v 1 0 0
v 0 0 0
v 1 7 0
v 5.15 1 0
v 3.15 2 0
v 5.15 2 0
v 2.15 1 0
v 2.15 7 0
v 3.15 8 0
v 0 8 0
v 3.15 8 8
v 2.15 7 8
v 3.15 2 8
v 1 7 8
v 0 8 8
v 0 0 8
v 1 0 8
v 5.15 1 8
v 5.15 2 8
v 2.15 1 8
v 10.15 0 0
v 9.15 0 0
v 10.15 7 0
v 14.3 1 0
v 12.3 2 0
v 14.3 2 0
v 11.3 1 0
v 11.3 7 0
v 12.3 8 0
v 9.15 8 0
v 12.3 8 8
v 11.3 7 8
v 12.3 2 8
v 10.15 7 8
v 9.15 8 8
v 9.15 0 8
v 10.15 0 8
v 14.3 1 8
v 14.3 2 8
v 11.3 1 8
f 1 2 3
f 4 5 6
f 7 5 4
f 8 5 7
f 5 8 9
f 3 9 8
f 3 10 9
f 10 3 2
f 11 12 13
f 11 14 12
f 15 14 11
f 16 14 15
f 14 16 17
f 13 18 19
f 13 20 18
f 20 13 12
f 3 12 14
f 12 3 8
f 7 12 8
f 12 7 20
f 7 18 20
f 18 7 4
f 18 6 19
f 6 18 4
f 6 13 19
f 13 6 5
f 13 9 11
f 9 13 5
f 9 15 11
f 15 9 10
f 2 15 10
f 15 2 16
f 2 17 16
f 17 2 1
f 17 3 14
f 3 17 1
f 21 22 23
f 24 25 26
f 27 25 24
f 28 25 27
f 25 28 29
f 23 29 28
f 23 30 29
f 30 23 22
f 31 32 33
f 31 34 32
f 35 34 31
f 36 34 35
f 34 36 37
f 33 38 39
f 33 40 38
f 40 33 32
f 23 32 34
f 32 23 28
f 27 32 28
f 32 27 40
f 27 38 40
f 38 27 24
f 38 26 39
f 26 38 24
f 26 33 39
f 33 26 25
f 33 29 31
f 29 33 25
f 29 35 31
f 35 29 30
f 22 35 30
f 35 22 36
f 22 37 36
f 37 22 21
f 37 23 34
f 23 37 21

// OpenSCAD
// Klammer (gruenes Teil) fuer Geberit Heberglocke AV02 / 5200.017 - parametrisch
// Masse aus der Handskizze des Originals. Umgedrehtes U (Schlitz fuer die Becherwand)
// mit Nase unten innen; das weisse Teil liegt in der Tasche auf der Nase auf.
// MakerWorld: "Parametric Model Maker" -> diese Datei hochladen.

/* [Masse] */
// Gesamthoehe [mm]
hoehe = 8; // [3:0.1:30]
// Dicke aeusseres Bein [mm]
bein = 1; // [0.6:0.1:5]
// Schlitzbreite = Becherwand [mm]
schlitz = 1; // [0.3:0.05:5]
// zusaetzliche Luft im Schlitz [mm]
spiel = 0.15; // [0:0.05:1]
// Dicke ueber dem Schlitz [mm]
steg_oben = 1; // [0.6:0.1:5]
// Dicke inneres Bein [mm]
bein_i = 1; // [0.6:0.1:5]
// Breite Nase ab Aussenkante inneres Bein (inkl. Bein) [mm]
nase_b = 3; // [1:0.1:15]
// Dicke der Nase [mm]
nase_d = 1; // [0.6:0.1:5]
// Abstand Oberkante bis Oberseite Nase [mm]
tasche = 6; // [1:0.1:29]
// Breite der Klammer (in die Tiefe) [mm]
breite = 8; // [2:0.5:30]
// Anzahl Klammern
anzahl = 2; // [1:1:8]

/* [Hidden] */
s  = schlitz + spiel;
x1 = bein; x2 = bein + s; x3 = bein + s + bein_i; xn = bein + s + nase_b;
yo = hoehe - tasche;
yu = max(0, yo - nase_d);
ys = hoehe - steg_oben;

module profil() {
    polygon([[0, 0], [x1, 0], [x1, ys], [x2, ys], [x2, yu], [xn, yu], [xn, yo],
             [x3, yo], [x3, hoehe], [0, hoehe]]);
}

// liegend gedruckt: Profil flach in XY, Breite in Z
for (k = [0 : anzahl - 1])
    translate([k * (xn + 4), 0, 0]) linear_extrude(height = breite) profil();
